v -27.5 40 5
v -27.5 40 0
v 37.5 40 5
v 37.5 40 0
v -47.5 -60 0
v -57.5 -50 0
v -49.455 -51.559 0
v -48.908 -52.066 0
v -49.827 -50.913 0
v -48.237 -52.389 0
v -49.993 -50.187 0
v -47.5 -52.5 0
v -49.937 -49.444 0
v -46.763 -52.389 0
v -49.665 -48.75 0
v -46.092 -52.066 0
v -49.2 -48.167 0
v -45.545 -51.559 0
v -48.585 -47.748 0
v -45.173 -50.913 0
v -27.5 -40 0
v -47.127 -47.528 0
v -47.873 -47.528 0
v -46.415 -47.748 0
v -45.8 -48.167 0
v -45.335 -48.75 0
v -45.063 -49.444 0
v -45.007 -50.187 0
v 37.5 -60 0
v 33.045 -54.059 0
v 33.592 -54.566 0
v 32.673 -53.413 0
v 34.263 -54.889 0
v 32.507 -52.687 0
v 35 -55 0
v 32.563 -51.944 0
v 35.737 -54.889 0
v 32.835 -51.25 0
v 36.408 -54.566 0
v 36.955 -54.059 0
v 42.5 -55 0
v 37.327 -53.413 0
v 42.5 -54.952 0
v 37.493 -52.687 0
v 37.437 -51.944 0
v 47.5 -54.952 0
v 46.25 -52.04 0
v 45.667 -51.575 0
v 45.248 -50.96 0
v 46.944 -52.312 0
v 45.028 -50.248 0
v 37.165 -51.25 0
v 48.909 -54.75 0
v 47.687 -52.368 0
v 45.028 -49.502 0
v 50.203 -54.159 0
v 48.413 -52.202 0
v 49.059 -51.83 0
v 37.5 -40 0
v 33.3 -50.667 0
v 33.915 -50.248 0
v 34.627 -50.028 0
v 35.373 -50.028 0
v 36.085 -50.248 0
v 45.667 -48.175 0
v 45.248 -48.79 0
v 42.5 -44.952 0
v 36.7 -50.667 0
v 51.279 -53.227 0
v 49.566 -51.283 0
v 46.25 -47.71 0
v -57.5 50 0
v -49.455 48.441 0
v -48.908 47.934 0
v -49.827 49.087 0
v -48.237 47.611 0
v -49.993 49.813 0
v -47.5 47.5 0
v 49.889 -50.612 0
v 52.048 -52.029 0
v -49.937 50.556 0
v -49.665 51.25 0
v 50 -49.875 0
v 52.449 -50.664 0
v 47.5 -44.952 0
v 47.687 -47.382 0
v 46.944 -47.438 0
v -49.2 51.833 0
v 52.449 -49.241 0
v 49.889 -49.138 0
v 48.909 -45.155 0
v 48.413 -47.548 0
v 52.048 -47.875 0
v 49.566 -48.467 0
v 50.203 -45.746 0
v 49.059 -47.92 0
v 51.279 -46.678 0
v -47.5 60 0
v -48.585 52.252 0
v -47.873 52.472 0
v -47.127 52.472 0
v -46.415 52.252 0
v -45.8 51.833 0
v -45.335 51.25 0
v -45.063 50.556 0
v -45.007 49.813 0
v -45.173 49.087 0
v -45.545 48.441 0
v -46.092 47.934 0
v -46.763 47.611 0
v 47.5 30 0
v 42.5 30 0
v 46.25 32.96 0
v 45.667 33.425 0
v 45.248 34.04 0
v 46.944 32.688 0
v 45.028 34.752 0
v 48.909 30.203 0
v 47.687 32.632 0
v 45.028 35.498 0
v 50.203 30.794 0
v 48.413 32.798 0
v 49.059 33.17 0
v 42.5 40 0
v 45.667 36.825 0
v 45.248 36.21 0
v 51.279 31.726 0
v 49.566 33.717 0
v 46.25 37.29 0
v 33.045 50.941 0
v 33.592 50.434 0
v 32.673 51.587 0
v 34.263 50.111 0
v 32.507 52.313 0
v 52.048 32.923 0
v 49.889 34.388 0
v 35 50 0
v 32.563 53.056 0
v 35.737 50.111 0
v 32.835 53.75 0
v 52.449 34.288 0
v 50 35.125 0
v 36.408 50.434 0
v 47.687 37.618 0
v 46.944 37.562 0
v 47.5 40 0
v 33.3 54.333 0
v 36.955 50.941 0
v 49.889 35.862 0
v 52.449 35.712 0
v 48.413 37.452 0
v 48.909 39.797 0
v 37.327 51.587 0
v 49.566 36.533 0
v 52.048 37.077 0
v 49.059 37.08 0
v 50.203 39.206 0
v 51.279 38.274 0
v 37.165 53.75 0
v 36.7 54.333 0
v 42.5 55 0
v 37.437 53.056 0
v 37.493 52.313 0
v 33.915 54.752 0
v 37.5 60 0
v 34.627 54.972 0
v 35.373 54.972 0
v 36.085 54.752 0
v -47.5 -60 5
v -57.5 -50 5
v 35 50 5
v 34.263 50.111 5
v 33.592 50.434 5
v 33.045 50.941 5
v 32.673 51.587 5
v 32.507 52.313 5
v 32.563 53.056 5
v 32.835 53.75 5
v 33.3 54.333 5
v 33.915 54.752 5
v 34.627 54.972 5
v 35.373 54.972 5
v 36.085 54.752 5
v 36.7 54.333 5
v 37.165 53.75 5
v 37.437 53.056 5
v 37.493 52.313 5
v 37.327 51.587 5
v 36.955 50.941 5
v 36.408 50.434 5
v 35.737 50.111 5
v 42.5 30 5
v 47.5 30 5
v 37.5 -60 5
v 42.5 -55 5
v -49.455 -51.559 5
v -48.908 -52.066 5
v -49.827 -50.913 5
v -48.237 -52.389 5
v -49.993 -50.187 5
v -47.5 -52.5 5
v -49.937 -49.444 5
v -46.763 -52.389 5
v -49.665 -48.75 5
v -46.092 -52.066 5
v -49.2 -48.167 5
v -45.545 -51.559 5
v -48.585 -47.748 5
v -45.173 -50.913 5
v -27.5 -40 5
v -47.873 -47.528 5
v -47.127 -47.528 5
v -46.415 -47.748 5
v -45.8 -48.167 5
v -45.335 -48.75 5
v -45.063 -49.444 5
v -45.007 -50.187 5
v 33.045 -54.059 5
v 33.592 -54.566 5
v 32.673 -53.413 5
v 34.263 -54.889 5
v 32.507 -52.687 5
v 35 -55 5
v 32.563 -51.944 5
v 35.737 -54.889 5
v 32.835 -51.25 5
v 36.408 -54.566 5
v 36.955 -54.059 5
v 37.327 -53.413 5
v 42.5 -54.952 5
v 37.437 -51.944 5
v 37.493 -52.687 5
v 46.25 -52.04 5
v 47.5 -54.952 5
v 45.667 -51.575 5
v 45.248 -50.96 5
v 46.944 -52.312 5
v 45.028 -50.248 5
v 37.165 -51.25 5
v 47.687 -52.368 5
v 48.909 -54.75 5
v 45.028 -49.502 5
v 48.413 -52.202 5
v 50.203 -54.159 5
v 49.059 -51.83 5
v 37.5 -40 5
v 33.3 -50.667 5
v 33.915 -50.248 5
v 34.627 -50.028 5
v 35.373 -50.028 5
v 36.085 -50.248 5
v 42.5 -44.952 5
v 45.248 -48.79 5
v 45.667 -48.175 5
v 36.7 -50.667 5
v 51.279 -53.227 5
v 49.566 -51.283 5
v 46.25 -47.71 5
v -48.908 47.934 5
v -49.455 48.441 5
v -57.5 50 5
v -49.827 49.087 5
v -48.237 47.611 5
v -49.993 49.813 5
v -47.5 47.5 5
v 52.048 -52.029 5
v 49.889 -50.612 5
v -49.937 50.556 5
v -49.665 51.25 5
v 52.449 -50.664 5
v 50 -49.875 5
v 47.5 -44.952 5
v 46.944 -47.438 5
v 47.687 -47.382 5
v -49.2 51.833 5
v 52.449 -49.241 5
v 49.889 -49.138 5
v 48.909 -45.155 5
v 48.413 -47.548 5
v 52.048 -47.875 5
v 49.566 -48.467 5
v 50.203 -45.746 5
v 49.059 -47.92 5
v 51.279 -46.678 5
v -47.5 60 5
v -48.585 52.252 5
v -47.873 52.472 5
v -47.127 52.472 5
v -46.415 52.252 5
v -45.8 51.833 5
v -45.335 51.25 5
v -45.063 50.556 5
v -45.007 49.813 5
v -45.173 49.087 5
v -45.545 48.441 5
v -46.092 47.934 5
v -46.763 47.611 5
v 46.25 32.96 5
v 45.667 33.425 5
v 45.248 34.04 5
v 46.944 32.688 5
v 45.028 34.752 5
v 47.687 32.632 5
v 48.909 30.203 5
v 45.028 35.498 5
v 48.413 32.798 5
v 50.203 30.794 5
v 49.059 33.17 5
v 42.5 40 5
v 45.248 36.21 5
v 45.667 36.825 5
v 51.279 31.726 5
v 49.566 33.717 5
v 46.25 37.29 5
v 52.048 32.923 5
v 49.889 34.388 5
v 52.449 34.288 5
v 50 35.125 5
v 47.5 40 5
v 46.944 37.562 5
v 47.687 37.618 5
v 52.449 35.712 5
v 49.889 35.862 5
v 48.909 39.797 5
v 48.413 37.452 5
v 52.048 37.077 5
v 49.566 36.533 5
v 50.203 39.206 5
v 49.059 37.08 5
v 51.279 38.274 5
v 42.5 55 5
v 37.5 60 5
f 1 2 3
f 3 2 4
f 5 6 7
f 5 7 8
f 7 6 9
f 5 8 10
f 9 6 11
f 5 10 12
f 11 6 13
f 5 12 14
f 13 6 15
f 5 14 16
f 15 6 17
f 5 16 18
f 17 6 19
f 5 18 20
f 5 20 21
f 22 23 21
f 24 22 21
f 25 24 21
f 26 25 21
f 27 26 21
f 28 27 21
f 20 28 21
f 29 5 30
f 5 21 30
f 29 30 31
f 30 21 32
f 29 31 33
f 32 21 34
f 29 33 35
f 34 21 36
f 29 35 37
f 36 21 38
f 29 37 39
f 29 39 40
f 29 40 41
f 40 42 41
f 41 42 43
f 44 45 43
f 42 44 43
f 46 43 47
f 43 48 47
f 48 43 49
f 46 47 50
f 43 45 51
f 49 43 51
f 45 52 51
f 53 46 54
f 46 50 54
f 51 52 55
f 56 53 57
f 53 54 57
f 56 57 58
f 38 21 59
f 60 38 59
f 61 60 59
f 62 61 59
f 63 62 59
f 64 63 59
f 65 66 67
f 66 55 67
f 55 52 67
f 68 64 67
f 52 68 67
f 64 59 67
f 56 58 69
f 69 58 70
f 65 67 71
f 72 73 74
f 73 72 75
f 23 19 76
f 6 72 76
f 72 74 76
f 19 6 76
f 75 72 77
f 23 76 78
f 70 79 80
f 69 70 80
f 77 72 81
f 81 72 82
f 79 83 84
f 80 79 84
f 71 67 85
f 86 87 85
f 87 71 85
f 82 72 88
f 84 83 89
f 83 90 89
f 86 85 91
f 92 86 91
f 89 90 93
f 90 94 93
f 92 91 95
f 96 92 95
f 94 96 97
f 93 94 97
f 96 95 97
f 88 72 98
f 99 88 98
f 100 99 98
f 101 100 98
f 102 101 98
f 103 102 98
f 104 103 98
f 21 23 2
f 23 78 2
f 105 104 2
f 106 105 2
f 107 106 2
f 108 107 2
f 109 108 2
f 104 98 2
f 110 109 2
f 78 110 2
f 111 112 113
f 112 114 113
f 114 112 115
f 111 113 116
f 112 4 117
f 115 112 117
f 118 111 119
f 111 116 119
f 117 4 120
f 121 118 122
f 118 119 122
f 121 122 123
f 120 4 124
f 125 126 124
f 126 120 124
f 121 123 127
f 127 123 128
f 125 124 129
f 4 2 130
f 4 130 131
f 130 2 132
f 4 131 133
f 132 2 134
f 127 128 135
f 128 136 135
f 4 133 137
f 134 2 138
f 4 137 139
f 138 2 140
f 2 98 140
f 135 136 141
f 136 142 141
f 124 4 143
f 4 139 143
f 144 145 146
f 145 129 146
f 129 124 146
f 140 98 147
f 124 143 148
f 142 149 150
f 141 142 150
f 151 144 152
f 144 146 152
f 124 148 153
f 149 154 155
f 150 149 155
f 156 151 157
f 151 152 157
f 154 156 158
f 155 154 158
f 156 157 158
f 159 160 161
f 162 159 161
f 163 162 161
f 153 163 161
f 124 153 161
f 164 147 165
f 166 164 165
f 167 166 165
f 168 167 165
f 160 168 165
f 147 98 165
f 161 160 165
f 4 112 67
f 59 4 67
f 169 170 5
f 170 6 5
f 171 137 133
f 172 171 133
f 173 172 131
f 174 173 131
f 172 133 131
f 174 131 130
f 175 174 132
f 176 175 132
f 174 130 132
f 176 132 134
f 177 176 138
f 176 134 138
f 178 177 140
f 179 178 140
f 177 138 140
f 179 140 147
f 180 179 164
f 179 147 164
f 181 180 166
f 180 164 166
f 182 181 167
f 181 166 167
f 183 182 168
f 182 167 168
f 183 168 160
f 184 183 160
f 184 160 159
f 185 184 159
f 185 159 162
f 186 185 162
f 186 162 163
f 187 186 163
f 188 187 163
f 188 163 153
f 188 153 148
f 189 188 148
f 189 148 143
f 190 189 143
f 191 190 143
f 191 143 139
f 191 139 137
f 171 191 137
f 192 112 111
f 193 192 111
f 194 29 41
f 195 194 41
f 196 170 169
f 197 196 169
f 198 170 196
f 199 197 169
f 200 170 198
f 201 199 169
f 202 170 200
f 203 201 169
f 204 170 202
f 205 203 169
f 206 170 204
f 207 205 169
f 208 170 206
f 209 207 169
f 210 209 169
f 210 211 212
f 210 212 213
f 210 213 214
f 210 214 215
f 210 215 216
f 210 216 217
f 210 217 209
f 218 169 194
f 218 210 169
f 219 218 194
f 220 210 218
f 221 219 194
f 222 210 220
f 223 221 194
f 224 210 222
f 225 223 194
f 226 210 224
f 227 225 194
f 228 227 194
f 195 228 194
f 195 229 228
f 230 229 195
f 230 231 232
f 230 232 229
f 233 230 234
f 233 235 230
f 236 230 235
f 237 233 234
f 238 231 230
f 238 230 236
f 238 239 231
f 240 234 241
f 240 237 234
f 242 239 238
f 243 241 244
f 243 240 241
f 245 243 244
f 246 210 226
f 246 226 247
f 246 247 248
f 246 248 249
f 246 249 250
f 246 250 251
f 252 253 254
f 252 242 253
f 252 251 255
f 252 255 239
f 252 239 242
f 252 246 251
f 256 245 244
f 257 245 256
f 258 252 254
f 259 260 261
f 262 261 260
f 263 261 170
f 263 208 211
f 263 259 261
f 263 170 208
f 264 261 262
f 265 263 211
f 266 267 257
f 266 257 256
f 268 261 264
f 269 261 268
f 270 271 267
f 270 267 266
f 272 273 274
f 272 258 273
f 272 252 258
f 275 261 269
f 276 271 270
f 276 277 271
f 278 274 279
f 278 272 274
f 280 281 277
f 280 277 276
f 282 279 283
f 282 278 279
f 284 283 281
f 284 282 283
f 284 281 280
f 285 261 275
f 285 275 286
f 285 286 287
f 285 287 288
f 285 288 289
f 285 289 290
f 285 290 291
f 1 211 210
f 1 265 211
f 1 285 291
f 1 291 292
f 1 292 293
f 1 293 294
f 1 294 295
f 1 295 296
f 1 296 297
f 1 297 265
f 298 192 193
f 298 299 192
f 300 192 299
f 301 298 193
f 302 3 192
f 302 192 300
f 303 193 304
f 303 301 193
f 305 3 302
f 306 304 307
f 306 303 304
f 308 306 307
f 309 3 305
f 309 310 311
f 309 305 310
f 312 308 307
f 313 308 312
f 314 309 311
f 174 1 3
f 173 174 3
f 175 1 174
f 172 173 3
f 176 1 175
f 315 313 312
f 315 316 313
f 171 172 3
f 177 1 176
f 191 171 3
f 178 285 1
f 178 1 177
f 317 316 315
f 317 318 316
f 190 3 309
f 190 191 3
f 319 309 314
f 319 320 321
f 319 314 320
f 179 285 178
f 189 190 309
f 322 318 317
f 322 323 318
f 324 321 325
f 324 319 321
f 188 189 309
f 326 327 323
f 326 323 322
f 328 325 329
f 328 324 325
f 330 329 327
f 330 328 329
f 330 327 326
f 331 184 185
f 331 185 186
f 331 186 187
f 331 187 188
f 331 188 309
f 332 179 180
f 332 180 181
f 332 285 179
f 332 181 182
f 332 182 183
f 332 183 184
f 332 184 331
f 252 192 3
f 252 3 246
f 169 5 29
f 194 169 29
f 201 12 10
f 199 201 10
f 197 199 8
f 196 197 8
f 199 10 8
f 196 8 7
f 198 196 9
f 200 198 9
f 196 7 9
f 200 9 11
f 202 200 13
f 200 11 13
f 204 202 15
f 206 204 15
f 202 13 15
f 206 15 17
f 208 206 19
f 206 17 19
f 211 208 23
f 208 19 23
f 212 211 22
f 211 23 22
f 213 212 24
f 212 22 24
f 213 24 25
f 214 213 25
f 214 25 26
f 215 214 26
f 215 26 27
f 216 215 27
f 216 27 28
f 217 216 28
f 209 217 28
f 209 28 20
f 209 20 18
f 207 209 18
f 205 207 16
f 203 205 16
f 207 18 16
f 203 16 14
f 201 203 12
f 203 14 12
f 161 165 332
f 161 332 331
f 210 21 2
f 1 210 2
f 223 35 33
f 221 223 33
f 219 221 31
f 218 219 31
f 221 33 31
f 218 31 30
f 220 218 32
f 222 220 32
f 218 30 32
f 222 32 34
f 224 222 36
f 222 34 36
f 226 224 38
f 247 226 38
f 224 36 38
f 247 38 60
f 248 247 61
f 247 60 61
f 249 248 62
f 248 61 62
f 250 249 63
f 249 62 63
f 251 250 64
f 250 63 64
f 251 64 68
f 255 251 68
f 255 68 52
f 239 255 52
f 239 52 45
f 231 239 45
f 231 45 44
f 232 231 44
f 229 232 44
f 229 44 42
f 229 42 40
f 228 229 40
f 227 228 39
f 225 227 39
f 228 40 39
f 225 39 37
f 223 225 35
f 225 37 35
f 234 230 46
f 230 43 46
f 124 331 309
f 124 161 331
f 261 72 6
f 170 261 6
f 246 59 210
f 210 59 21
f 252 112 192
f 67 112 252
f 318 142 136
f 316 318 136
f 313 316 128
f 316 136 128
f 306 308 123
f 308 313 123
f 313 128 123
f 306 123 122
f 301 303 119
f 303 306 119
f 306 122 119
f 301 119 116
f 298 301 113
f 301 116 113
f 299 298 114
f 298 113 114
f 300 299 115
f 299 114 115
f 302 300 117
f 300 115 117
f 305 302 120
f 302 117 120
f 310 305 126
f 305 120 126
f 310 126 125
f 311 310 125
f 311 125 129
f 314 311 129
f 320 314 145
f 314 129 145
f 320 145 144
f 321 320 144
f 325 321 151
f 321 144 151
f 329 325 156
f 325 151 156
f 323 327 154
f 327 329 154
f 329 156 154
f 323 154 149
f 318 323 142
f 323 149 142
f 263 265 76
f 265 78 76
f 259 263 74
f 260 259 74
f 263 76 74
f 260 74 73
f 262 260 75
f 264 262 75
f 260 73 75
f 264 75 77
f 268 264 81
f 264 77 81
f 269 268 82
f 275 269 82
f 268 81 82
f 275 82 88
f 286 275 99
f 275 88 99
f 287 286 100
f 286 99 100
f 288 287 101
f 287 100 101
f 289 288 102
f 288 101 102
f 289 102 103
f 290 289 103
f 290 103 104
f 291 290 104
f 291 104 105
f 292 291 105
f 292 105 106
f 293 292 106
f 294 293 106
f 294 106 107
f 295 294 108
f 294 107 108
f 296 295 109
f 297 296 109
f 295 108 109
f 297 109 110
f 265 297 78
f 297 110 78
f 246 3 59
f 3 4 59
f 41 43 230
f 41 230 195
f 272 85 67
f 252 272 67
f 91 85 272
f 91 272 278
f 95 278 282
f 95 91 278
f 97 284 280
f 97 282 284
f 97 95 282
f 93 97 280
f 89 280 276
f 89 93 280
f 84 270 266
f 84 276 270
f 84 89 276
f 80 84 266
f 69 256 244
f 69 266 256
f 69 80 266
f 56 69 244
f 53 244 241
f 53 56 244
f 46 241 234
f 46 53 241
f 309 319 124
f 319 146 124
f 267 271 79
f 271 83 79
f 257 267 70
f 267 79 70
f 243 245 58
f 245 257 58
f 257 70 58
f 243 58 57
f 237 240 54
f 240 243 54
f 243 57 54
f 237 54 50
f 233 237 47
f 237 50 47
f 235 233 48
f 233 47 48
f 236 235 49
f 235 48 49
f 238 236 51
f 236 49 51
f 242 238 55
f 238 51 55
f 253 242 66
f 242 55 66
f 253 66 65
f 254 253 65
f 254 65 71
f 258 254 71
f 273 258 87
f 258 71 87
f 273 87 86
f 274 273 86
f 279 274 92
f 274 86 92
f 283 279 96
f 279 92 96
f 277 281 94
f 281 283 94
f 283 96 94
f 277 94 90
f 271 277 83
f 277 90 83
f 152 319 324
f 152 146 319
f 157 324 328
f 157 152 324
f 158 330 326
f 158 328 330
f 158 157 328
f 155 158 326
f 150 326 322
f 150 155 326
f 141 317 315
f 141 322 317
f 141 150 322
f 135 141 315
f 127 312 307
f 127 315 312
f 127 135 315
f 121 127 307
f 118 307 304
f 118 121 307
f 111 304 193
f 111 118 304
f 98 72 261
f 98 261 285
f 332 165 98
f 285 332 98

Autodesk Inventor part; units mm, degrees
ref_plane "YZ Plane" through (0, 0, 0) normal (1, 0, 0) x (0, 1, 0)
ref_plane "XZ Plane" through (0, 0, 0) normal (0, 1, 0) x (-1, 0, 0)
ref_plane "XY Plane" through (0, 0, 0) normal (0, 0, 1) x (1, 0, 0)
sketch "Sketch1" plane through (0, 0, 0) normal (0, 0, 1) x (1, 0, 0)
  circle A0 centre (47.5, -34.875) radius 2.5 projected
  circle A1 centre (47.5, 50.125) radius 2.5 projected
  circle A2 centre (47.5, 35.125) radius 2.5 projected
  circle A3 centre (47.5, -49.875) radius 2.5 projected
  line L0 (50, -60) -> (52.5, -62.5) projected
  line L1 (52.5, -62.5) -> (52.5, -15) projected
  line L2 (52.5, -15) -> (37.5, -15) projected
  line L3 (37.5, -15) -> (37.5, -40) projected
  line L4 (37.5, -40) -> (27.5, -50) projected
  line L5 (27.5, -50) -> (-27.5, -50) projected
  line L6 (-27.5, -50) -> (-27.5, 50) projected
  line L7 (-27.5, 50) -> (27.5, 50) projected
  line L8 (27.5, 50) -> (37.5, 40) projected
  line L9 (37.5, 40) -> (37.5, 15) projected
  line L10 (37.5, 15) -> (52.5, 15) projected
  line L11 (52.5, 15) -> (52.5, 62.5) projected
  line L12 (52.5, 62.5) -> (50, 60) projected
  line L13 (50, 60) -> (-47.5, 60) projected
  line L14 (-57.5, 50) -> (-57.5, -50) projected
  line L15 (-47.5, -60) -> (50, -60) projected
  line L16 (-47.5, 60) -> (37.5, 60)
  line L17 (37.5, -60) -> (-47.5, -60)
  line L18 (-57.5, -50) -> (-57.5, 50)
  line L19 (0, 0) -> (31.4372, 0) construction
  line L20 (42.5, -54.9524) -> (47.5, -54.9524)
  line L21 (52.5, -49.9524) -> (52.5, -49.9524)
  line L22 (47.5, -44.9524) -> (42.5, -44.9524)
  arc A4 (52.5, -49.9524) -> (47.5, -44.9524) centre (47.5, -49.9524) ccw
  arc A5 (47.5, -54.9524) -> (52.5, -49.9524) centre (47.5, -49.9524) ccw
  line L23 (42.5, -54.9524) -> (42.5, -55)
  line L24 (42.5, 30) -> (47.5, 30)
  line L25 (47.5, 40) -> (42.5, 40)
  arc A6 (52.5, 35) -> (47.5, 40) centre (47.5, 35) ccw
  arc A7 (47.5, 30) -> (52.5, 35) centre (47.5, 35) ccw
  line L26 (42.5, 55) -> (42.5, 40)
  line L27 (42.5, 30) -> (42.5, -44.9524)
  line L28 (-27.5, 40) -> (37.5, 40)
  line L29 (37.5, 40) -> (37.5, -40)
  line L30 (37.5, -40) -> (-27.5, -40)
  line L31 (-27.5, -40) -> (-27.5, 40)
  line L32 (-57.5, 50) -> (-47.5, 60)
  line L33 (-57.5, -50) -> (-47.5, -60)
  line L34 (37.5, 60) -> (42.5, 55)
  line L35 (37.5, -60) -> (42.5, -55)
  circle A8 centre (-47.5, -50) radius 2.5 projected
  circle A9 centre (35, 52.5) radius 2.5 projected
  circle A10 centre (35, -52.5) radius 2.5 projected
  circle A11 centre (-47.5, 50) radius 2.5 projected
  line L36 (-57.5, -50) -> (-47.5, -60) projected
  line L37 (-47.5, 60) -> (-57.5, 50) projected
  point P0 (-57.5, 60)
  point P1 (42.5, -60)
  point P2 (42.5, 60)
  point P3 (-57.5, -60)
  point P4 (52.5, -44.9524)
  point P5 (52.5, -54.9524)
  point P6 (-57.5, 50)
  point P7 (-57.5, -50)
  point P8 (-27.5, -40)
  dimension "d2" = 10
  dimension "d3" = 10
  dimension "d4" = 10
  dimension "d5" = 5
  dimension "d6" = 5
  dimension "d7" = 5
  dimension "d8" = 5
  dimension "d9" = 30
  dimension "d10" = 10
  dimension "d11" = 10
  dimension "d12" = 10
  dimension "d13" = 10
  dimension "d14" = 10
  dimension "d15" = 5
  dimension "d16" = 5
  dimension "d17" = 5
  dimension "d18" = 5
extrude "Extrusion1" add sketch "Sketch1" along normal blind 5 contours L15 L33 L14 L32 L13 L34 L26 L25 A6 A7 L24 L27 L10 L9 L8 L7 L6 L5 L4 L3 L2 L22 A4 A5 L20 L23 L35 | L2 L29 L10 L27 | L4 L5 L6 L30 | L28 L6 L7 L8 | A8 | A9 | A10 | A11
sketch "Sketch2" plane through (0, 0, 5) normal (0, 0, 1) x (1, 0, 0)
  line L0 (37.5, 60) -> (-47.5, 60) projected
  line L1 (42.5, 40) -> (42.5, 55) projected
  line L2 (37.5, 40) -> (37.5, -40) projected
  line L3 (37.5, 0) -> (-27.5, 0) construction
  line L4 (-27.5, -40) -> (-27.5, 40) projected
  line L5 (-57.5, 50) -> (-57.5, -50) projected
  point P0 (0, 0)
  point P1 (-47.5, 50)
  point P2 (35, 52.5)
  point P3 (35, -52.5)
  point P4 (-27.5, -50)
  point P5 (-27.5, 50)
  point P6 (-47.5, -50)
  dimension "d21" = 7.5
  dimension "d22" = 7.5
  dimension "d23" = 10
  dimension "d24" = 10
hole "Hole1" at (-47.5, 50, 5) at (35, 52.5, 5) at (35, -52.5, 5) at (-47.5, -50, 5) direction (0, 0, -1) diameter 5 end through all
equation "\"d12\" = d11"
equation "\"d13\" = d11"
equation "\"d14\" = d13"
equation "\"d16\" = d15"
equation "\"d17\" = d15"
equation "\"d18\" = d17"
properties part number "Tapa" material "MDF Medium Density Fiberboard"
